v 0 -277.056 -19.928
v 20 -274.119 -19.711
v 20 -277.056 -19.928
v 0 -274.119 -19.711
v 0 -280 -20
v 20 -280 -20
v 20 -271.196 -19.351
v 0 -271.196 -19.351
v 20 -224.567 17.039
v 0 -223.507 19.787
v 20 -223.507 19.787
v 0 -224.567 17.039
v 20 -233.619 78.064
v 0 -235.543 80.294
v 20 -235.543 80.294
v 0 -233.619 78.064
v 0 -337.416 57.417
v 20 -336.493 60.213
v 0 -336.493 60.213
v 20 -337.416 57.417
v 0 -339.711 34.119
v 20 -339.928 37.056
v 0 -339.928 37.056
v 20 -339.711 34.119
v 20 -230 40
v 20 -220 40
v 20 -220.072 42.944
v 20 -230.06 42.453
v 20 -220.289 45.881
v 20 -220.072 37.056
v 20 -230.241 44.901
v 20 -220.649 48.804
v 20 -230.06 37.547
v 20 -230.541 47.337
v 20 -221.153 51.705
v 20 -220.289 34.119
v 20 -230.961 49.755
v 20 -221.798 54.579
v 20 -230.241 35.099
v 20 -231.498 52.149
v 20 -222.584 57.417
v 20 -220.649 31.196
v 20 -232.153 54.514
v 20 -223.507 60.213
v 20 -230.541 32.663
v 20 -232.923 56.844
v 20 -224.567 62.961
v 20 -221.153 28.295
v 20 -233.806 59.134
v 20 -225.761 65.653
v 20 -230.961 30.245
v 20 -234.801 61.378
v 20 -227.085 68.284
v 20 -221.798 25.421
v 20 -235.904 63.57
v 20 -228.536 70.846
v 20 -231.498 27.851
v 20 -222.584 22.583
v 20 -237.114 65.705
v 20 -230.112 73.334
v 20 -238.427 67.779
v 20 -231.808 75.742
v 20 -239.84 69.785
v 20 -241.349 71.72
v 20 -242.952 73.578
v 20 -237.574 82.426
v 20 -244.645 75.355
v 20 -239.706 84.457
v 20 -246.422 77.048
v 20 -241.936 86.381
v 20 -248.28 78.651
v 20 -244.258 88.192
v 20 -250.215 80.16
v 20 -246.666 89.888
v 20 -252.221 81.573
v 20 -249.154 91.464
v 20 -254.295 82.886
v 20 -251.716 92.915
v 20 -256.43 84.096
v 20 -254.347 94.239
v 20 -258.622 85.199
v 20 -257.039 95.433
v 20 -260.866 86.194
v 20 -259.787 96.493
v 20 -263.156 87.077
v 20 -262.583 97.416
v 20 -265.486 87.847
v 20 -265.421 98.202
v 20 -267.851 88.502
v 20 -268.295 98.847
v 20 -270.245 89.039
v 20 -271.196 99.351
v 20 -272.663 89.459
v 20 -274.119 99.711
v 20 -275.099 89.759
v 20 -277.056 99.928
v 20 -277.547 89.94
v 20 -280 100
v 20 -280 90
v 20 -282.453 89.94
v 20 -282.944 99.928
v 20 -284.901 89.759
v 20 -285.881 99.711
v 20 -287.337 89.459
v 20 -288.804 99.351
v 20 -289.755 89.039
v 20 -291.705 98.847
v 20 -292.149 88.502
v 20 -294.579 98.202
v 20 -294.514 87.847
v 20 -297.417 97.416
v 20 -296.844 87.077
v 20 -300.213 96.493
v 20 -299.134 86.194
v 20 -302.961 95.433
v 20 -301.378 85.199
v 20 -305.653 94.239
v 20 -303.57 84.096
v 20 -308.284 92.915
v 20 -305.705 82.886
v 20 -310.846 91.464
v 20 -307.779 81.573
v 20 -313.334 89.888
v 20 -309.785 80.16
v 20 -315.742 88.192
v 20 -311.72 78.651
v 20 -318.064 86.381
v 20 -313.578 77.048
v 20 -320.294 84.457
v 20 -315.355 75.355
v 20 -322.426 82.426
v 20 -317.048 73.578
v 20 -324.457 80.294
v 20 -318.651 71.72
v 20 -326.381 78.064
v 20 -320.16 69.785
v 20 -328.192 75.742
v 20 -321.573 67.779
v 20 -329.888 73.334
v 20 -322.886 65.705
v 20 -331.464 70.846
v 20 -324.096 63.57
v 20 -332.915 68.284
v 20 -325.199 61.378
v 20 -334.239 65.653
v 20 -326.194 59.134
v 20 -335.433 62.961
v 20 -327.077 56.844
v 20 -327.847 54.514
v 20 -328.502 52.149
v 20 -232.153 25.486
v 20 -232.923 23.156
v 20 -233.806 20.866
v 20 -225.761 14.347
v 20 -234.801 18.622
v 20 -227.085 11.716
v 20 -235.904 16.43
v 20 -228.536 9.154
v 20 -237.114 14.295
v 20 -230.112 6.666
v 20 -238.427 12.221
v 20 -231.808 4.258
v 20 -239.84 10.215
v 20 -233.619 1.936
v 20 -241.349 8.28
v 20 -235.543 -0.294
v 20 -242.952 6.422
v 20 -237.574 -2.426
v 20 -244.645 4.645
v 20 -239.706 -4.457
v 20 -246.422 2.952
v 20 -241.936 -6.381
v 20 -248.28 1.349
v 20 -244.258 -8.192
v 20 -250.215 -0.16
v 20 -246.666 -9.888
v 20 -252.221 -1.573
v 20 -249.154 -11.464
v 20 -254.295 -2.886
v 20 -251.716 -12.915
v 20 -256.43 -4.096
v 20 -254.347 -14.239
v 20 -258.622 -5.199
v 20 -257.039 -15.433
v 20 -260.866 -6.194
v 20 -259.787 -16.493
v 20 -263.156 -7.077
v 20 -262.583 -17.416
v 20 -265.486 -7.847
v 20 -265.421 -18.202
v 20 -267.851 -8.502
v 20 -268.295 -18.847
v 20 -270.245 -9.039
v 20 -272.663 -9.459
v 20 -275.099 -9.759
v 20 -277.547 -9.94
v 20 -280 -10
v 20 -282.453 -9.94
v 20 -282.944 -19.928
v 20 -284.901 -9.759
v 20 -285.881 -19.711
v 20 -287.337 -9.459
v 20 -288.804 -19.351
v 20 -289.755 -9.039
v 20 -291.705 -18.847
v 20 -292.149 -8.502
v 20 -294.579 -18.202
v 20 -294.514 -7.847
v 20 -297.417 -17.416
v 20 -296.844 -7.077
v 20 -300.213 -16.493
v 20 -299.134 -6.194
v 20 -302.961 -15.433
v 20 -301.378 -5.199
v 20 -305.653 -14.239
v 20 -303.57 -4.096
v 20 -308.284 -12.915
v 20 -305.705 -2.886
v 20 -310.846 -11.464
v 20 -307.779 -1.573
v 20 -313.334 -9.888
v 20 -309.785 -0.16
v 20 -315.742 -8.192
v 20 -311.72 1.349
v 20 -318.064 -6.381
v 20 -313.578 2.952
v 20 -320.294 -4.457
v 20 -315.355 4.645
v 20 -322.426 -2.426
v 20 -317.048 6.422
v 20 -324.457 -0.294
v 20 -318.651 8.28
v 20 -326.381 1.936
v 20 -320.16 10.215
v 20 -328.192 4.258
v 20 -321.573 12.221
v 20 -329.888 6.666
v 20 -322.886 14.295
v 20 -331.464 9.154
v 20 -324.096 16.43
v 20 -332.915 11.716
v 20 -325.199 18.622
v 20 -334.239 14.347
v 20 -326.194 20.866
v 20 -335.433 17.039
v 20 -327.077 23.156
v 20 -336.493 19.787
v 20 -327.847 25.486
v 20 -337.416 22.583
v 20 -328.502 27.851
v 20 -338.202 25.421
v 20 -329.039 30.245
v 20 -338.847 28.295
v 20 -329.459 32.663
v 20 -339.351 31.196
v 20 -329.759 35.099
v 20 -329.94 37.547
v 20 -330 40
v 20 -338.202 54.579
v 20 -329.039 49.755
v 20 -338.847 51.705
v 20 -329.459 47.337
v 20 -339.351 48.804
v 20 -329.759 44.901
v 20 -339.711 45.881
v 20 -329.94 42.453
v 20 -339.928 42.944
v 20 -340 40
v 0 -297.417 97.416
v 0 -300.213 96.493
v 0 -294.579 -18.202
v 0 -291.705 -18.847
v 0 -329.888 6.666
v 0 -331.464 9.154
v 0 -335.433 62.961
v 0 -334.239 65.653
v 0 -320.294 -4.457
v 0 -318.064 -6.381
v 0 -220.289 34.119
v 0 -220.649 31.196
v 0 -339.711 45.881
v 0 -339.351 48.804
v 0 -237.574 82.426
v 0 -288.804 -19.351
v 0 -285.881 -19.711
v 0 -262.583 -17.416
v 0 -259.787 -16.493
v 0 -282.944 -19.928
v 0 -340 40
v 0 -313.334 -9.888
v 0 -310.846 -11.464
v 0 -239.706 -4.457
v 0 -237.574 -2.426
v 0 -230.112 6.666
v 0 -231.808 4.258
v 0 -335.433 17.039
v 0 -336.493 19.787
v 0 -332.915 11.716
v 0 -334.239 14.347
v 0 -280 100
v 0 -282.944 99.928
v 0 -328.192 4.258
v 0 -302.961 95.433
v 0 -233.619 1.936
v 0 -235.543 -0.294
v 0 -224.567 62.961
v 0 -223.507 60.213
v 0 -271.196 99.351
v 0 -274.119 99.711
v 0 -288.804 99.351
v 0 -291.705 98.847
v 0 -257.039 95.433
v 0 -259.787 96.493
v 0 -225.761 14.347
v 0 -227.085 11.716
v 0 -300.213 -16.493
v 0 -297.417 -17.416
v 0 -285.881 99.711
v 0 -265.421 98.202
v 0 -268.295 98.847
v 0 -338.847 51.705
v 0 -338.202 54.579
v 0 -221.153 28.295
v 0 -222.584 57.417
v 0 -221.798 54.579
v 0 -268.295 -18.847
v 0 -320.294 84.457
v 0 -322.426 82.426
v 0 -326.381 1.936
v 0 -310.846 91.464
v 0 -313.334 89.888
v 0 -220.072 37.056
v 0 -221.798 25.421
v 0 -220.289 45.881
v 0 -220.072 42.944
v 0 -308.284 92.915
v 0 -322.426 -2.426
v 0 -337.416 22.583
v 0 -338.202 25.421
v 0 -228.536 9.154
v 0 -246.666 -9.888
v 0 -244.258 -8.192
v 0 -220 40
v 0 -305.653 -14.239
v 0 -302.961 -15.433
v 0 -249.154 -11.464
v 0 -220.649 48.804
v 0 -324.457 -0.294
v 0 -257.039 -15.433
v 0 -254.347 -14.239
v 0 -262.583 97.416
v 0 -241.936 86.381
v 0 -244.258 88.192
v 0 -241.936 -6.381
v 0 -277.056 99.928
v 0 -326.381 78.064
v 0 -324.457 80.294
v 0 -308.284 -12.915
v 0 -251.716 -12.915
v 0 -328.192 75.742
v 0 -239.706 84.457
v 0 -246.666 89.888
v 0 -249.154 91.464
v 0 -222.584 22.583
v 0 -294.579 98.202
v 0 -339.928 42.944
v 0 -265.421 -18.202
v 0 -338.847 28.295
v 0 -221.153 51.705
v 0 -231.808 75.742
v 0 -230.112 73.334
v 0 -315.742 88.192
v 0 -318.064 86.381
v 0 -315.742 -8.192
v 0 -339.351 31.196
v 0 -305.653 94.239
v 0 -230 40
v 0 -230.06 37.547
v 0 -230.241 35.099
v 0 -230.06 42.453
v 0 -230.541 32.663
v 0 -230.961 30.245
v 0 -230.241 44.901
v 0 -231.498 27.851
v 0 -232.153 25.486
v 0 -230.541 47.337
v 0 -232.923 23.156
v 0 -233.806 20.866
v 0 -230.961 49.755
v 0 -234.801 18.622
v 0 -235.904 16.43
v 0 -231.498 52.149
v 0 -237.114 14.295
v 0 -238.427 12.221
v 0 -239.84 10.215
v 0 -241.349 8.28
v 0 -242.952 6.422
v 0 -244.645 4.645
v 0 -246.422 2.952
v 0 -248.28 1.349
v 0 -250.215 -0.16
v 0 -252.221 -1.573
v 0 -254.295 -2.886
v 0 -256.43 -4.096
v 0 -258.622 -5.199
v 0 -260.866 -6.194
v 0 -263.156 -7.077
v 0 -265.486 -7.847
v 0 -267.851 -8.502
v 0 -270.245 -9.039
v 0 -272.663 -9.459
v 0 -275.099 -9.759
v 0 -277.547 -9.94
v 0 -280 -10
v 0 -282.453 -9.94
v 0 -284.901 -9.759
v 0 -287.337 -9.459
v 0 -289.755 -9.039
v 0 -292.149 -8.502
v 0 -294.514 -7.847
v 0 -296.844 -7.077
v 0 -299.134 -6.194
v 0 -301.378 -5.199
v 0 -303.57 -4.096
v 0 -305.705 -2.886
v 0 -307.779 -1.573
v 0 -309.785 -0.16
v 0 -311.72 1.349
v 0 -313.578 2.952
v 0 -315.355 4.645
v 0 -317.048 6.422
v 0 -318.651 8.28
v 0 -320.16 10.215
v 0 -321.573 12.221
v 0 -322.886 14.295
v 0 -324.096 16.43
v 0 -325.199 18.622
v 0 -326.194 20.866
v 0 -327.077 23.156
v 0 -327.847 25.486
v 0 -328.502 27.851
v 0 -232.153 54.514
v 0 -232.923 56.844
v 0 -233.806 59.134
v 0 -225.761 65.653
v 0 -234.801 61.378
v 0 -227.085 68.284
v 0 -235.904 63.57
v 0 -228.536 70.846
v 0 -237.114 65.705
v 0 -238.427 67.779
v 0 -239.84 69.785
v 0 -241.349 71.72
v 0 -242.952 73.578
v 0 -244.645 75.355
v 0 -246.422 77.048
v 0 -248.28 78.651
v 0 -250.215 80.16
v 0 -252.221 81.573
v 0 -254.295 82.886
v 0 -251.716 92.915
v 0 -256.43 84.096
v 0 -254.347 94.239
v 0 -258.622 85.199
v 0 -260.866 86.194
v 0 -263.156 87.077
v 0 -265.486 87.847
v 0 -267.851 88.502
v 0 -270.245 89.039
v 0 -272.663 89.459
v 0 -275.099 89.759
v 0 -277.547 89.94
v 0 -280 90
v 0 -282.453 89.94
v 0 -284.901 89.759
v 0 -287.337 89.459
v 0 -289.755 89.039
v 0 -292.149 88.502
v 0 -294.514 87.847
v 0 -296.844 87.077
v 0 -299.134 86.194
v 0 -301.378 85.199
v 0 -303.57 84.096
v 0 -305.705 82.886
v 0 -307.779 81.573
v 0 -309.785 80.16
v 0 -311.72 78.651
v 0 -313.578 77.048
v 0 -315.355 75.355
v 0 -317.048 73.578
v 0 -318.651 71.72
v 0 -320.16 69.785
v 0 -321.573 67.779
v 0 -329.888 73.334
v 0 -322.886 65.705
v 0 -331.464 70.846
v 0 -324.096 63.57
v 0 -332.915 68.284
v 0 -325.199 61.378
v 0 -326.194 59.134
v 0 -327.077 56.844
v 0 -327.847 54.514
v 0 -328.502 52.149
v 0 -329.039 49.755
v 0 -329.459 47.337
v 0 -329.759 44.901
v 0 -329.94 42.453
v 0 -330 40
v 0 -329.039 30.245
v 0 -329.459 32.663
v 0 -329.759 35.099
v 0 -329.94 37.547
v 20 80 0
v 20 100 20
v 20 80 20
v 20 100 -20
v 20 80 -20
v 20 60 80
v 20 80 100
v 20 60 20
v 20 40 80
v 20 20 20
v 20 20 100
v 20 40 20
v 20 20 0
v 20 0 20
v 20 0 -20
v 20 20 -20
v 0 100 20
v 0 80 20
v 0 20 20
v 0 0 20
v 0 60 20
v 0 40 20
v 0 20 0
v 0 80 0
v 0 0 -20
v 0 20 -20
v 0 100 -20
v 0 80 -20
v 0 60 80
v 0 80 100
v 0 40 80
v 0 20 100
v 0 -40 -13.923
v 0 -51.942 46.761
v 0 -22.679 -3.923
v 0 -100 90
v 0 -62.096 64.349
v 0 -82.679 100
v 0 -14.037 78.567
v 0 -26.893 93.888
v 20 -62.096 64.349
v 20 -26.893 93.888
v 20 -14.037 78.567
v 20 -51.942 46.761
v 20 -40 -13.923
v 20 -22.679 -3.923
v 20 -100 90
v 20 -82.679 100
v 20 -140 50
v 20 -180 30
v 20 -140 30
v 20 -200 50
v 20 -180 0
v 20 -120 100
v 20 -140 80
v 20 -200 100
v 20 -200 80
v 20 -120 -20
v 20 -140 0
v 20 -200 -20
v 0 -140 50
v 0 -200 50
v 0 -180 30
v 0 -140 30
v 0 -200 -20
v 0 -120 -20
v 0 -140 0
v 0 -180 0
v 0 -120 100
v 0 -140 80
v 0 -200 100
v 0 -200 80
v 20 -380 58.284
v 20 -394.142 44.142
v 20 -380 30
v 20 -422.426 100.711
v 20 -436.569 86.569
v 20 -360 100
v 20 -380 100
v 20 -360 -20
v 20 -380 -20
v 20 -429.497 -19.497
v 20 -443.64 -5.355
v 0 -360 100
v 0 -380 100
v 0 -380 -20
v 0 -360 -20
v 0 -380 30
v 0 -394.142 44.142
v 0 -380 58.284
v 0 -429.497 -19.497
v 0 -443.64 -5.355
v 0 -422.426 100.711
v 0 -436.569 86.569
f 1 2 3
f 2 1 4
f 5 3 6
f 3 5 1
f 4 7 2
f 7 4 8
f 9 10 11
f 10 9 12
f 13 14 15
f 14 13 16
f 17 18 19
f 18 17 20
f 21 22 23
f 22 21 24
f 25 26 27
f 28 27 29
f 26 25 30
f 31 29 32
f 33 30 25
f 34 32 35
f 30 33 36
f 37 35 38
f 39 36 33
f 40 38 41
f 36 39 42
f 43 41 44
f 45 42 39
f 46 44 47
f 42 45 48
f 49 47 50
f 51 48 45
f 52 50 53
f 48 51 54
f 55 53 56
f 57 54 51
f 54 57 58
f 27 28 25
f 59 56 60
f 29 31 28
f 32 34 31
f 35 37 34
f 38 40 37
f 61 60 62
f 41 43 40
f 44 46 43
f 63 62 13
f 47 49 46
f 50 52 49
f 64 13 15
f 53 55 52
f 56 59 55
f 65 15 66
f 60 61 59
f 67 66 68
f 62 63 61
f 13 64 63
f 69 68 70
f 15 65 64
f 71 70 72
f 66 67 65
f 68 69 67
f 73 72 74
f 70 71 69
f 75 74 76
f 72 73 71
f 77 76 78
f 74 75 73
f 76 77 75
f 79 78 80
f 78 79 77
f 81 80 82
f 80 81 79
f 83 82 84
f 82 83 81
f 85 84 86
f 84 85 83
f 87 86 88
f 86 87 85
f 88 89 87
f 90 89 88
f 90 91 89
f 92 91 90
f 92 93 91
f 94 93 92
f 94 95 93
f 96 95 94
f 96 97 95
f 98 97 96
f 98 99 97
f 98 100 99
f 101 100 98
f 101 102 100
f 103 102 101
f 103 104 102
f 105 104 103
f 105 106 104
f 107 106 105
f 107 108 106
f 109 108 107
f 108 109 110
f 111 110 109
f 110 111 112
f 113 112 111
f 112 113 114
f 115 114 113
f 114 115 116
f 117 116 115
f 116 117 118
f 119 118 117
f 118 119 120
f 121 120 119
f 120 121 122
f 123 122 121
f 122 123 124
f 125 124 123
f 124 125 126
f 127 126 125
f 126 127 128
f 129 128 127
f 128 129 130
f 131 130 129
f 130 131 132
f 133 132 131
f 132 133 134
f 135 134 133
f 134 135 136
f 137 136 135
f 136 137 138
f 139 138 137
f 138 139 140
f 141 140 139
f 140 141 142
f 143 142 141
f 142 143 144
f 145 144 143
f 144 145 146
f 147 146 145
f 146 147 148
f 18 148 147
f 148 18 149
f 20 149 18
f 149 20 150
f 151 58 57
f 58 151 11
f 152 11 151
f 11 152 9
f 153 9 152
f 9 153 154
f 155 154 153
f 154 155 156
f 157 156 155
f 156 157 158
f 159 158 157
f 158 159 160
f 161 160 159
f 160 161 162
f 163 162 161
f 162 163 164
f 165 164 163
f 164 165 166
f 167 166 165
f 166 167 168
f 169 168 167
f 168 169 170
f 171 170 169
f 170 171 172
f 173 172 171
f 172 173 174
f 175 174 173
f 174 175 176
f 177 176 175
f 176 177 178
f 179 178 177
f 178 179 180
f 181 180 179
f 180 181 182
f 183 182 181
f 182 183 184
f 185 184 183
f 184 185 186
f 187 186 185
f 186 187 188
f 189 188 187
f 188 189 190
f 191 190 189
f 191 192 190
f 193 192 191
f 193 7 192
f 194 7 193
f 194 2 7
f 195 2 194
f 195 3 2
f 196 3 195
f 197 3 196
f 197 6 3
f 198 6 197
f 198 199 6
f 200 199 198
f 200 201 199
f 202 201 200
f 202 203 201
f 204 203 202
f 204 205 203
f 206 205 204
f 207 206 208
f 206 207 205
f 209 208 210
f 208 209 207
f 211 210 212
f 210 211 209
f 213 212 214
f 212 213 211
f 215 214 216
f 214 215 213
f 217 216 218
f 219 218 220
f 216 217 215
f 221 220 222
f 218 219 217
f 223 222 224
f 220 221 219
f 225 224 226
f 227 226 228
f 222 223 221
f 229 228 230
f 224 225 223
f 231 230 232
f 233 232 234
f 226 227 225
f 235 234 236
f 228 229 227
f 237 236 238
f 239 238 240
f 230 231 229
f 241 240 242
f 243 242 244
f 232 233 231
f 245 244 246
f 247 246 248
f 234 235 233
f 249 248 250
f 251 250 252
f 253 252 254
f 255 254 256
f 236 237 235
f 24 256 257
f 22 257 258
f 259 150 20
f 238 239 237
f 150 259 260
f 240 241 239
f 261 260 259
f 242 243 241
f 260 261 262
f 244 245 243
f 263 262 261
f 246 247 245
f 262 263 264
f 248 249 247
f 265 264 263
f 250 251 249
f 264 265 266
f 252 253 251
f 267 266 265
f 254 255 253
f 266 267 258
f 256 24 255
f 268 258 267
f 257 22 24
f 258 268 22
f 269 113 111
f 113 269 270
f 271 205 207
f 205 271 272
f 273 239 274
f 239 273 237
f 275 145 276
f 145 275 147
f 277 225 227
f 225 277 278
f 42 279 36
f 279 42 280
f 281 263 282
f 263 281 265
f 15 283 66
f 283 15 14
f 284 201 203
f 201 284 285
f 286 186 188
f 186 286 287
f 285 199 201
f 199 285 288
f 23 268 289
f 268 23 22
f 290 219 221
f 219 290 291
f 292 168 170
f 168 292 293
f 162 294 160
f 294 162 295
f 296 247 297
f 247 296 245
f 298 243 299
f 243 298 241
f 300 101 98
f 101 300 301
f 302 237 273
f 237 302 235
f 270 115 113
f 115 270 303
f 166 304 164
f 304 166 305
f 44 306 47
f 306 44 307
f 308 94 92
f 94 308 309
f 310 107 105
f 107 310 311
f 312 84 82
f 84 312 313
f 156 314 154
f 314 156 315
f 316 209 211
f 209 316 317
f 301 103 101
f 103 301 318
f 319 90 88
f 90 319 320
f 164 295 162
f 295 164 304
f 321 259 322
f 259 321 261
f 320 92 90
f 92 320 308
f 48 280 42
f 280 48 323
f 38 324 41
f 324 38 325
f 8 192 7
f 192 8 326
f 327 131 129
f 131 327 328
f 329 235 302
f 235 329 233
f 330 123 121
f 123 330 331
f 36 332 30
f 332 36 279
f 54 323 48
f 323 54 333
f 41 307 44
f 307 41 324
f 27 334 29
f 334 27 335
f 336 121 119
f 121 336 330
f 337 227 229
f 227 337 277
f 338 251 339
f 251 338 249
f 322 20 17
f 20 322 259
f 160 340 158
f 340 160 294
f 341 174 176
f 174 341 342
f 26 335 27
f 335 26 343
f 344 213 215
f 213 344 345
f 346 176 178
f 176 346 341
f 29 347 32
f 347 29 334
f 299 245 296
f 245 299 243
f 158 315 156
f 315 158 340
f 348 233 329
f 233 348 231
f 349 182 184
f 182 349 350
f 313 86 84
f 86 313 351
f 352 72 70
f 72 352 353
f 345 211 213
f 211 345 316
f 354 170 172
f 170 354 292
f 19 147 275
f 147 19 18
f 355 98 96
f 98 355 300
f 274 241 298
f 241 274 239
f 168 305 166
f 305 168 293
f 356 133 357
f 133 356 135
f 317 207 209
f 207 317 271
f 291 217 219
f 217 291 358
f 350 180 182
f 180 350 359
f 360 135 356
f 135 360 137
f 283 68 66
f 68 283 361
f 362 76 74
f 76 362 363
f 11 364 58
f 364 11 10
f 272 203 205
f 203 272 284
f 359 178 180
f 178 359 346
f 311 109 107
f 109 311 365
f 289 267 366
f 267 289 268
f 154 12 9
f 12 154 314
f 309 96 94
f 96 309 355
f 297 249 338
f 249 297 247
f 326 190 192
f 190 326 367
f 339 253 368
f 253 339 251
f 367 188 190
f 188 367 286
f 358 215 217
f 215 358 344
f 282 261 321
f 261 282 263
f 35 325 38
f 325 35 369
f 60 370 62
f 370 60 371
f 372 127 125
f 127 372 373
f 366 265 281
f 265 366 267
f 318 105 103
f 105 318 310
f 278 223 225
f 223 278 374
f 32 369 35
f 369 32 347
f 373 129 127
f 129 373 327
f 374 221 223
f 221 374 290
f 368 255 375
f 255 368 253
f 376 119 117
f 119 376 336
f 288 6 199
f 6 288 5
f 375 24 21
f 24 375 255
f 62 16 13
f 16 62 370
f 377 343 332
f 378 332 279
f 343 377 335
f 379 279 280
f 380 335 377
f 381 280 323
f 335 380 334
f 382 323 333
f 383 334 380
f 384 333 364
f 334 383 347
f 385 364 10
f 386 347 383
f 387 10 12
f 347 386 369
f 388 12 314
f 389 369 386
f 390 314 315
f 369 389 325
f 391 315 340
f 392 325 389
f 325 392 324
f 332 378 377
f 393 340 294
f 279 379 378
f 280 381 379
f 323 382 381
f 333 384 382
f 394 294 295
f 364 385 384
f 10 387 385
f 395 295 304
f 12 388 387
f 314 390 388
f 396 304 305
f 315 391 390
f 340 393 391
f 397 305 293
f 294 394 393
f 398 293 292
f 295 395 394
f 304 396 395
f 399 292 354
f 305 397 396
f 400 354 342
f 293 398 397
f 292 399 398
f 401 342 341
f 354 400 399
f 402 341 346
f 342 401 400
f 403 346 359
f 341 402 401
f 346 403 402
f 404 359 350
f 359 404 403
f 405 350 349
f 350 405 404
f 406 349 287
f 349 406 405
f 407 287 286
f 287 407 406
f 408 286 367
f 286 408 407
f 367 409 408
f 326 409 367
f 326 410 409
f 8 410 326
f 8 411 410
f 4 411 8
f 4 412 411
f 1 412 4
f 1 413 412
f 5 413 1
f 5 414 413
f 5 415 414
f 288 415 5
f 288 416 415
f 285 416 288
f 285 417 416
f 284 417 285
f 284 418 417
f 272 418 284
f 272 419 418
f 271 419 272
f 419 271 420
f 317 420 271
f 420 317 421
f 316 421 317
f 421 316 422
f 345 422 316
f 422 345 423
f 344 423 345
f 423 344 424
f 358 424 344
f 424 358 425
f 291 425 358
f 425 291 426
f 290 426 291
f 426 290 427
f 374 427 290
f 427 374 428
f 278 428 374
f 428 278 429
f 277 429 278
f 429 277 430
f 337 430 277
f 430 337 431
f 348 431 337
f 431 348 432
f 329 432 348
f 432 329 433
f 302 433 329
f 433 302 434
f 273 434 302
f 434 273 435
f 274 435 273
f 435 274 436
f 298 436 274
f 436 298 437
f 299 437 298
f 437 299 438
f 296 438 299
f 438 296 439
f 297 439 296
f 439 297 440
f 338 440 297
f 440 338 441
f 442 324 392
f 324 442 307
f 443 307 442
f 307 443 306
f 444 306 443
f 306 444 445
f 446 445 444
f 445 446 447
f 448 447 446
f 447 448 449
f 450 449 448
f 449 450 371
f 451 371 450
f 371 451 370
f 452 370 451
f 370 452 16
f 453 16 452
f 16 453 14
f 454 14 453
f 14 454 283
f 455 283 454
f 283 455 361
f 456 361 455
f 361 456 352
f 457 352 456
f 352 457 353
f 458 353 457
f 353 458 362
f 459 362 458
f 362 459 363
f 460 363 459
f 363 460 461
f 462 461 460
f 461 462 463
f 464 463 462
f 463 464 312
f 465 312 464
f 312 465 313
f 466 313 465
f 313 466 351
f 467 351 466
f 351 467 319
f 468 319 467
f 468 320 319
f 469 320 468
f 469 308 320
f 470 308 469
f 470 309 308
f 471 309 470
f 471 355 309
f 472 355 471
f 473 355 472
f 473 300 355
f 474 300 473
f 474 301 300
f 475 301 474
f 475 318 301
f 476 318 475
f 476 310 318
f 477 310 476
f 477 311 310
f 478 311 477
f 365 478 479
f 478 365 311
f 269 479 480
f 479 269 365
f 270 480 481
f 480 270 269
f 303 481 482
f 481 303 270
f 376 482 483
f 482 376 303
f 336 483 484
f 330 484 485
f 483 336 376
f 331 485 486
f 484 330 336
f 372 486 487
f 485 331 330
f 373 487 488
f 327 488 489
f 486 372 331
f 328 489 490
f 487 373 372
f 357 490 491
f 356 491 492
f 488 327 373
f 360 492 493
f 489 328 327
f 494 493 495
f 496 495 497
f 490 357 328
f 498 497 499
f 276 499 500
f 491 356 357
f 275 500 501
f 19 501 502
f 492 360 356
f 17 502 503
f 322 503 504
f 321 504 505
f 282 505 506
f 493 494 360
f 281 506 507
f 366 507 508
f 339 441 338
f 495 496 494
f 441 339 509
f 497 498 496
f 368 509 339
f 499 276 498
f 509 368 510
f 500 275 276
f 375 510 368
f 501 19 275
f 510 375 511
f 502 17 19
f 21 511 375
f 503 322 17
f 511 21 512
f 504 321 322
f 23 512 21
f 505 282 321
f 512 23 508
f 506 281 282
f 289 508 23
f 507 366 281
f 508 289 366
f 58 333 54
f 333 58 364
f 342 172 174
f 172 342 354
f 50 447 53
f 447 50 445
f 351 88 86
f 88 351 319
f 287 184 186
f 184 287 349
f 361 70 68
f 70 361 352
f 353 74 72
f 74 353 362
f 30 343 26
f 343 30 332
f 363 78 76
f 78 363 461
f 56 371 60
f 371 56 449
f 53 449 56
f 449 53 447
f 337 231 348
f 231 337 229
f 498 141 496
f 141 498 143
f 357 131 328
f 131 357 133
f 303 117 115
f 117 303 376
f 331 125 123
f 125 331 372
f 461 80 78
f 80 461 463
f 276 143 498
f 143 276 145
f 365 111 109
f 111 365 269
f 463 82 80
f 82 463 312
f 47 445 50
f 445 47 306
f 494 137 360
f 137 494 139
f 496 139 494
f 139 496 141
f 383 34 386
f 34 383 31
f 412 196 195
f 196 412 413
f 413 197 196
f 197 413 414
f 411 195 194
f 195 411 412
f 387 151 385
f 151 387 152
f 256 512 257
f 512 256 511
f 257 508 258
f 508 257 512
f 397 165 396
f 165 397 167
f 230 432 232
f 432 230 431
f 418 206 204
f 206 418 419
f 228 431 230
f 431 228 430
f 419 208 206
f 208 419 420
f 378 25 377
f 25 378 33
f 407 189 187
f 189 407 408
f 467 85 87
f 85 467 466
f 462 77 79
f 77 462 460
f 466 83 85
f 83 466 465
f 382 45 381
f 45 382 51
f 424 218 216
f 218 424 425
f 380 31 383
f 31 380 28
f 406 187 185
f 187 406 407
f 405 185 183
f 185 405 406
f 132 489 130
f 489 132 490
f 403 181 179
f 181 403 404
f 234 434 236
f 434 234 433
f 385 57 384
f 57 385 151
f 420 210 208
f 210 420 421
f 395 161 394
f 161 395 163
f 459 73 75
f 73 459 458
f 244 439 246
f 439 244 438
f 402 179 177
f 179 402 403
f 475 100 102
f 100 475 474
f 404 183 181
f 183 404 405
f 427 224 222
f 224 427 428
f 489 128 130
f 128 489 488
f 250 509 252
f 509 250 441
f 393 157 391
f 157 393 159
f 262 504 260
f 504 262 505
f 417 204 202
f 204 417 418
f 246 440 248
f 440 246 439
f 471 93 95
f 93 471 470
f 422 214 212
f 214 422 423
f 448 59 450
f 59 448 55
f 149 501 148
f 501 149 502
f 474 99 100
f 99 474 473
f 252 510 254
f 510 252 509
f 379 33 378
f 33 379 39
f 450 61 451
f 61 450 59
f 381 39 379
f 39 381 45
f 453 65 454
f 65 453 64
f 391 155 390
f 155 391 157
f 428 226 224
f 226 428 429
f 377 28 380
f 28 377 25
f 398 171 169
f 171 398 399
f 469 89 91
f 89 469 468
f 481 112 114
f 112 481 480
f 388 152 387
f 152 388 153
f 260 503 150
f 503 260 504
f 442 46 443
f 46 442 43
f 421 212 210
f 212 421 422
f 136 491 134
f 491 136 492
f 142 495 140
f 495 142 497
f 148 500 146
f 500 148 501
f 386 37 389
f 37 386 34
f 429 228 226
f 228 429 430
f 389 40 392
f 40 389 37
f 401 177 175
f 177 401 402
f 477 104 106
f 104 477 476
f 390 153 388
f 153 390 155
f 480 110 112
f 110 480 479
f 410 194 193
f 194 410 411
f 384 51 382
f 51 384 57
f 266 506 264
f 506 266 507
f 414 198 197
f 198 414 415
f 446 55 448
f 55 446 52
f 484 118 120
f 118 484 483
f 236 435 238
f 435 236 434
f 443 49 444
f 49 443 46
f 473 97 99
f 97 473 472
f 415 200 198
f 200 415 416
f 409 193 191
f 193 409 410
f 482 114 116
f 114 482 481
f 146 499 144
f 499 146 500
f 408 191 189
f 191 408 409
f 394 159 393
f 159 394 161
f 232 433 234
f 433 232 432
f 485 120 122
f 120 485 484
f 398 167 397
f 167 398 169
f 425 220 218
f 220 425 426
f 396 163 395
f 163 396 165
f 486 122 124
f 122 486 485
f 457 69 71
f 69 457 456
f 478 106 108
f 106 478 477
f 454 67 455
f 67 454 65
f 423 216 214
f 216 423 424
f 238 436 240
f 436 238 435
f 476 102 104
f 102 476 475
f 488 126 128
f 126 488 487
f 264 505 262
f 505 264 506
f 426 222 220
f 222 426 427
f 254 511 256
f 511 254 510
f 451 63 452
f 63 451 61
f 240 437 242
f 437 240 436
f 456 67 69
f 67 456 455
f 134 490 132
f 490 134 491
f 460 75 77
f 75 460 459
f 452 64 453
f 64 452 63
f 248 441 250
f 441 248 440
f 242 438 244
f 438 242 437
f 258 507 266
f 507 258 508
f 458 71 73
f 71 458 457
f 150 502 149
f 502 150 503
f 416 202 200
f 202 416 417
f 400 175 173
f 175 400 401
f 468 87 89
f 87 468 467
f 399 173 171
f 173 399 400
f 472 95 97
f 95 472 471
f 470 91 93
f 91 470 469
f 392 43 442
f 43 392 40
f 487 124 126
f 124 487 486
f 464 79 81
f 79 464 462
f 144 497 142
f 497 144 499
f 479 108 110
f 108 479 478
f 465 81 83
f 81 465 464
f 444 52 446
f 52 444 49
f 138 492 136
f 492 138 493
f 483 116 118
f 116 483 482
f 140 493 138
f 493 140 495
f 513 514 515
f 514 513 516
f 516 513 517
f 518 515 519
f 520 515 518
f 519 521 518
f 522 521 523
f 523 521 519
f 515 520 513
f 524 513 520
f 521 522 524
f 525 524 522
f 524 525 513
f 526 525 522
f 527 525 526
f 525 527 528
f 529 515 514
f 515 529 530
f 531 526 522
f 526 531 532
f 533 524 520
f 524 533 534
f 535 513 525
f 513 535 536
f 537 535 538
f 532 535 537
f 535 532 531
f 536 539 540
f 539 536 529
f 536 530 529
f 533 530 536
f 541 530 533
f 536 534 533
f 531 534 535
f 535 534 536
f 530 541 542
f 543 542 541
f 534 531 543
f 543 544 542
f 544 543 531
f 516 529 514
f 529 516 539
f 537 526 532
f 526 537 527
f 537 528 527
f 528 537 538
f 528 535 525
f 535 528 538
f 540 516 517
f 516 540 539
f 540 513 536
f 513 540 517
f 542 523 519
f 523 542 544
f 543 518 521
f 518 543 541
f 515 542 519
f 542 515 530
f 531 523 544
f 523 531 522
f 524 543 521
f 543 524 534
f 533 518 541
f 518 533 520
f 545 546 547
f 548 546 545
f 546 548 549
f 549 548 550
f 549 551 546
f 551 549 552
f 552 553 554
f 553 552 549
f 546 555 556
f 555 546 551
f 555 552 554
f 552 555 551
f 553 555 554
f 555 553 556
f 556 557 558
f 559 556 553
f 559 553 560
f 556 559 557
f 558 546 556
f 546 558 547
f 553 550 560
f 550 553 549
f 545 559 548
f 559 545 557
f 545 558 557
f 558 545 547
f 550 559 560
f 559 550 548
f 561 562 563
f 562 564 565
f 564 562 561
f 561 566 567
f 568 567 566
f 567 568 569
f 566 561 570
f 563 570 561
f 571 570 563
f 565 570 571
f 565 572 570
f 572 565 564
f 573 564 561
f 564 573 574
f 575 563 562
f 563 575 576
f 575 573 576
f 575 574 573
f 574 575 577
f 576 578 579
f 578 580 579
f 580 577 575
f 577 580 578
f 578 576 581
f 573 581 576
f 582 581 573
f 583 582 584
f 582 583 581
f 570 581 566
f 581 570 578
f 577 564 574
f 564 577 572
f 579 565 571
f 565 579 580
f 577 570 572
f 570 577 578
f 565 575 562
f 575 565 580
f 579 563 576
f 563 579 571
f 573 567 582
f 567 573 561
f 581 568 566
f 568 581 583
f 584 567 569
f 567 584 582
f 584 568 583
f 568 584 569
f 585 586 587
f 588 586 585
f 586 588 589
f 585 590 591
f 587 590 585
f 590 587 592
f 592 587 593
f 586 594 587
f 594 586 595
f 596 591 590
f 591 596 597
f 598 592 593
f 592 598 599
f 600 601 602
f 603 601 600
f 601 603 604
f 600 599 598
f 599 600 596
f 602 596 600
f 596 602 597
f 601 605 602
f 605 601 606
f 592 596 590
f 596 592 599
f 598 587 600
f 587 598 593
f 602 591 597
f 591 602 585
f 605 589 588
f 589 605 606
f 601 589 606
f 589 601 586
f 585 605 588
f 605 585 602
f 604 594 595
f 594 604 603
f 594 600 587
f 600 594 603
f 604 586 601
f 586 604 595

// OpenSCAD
$fn=128 ;
// Буква Д
  cube ([20, 100, 20]) ; 
   translate ([0, 0, -20]) cube ([20, 20, 20]) ;
    translate ([0, 80, -20]) cube ([20, 20, 20]) ;
     translate ([0, 20, 80]) cube ([20, 60, 20]) ;
      translate ([0, 20, 20]) cube ([20, 20, 60]) ;
       translate ([0, 60, 20]) cube ([20, 20, 60]) ;

// Буква У
 translate ([0, -60, 40]) rotate ([40, 0, 0]) cube ([20, 60, 20]) ; 
 translate ([0, -100, 90]) rotate ([-60, 0, 0]) cube ([20, 120, 20]) ; 

// Буква Б
 translate ([0, -200, 30]) cube ([20, 80, 20]) ; 
 translate ([0, -200, -20]) cube ([20, 80, 20]) ; 
 translate ([0, -180, -20]) rotate ([90, 0, 0]) cube ([20, 70, 20]) ; 
 translate ([0, -120, -20]) rotate ([90, 0, 0]) cube ([20, 120, 20]) ; 
 translate ([0, -200, 80]) cube ([20, 80, 20]) ;
 
// Буква О 
 rotate ([0, 90, 0])
 translate ([-40, 0, 0])
 difference () {
 translate([0,-280, 0]) cylinder (20, 60, 60) ;
 translate([0,-280, -10])  cylinder (40, 50, 50) ;
}

// Буква К 
 translate ([0, -380, -20]) cube ([20, 20, 120]) ; 
 translate ([0, -380, 30]) rotate ([45, 0, 0 ]) cube ([20, 20, 80]) ;
 translate ([0, -380, 30]) rotate ([135, 0, 0 ]) cube ([20, 20, 70]) ;
